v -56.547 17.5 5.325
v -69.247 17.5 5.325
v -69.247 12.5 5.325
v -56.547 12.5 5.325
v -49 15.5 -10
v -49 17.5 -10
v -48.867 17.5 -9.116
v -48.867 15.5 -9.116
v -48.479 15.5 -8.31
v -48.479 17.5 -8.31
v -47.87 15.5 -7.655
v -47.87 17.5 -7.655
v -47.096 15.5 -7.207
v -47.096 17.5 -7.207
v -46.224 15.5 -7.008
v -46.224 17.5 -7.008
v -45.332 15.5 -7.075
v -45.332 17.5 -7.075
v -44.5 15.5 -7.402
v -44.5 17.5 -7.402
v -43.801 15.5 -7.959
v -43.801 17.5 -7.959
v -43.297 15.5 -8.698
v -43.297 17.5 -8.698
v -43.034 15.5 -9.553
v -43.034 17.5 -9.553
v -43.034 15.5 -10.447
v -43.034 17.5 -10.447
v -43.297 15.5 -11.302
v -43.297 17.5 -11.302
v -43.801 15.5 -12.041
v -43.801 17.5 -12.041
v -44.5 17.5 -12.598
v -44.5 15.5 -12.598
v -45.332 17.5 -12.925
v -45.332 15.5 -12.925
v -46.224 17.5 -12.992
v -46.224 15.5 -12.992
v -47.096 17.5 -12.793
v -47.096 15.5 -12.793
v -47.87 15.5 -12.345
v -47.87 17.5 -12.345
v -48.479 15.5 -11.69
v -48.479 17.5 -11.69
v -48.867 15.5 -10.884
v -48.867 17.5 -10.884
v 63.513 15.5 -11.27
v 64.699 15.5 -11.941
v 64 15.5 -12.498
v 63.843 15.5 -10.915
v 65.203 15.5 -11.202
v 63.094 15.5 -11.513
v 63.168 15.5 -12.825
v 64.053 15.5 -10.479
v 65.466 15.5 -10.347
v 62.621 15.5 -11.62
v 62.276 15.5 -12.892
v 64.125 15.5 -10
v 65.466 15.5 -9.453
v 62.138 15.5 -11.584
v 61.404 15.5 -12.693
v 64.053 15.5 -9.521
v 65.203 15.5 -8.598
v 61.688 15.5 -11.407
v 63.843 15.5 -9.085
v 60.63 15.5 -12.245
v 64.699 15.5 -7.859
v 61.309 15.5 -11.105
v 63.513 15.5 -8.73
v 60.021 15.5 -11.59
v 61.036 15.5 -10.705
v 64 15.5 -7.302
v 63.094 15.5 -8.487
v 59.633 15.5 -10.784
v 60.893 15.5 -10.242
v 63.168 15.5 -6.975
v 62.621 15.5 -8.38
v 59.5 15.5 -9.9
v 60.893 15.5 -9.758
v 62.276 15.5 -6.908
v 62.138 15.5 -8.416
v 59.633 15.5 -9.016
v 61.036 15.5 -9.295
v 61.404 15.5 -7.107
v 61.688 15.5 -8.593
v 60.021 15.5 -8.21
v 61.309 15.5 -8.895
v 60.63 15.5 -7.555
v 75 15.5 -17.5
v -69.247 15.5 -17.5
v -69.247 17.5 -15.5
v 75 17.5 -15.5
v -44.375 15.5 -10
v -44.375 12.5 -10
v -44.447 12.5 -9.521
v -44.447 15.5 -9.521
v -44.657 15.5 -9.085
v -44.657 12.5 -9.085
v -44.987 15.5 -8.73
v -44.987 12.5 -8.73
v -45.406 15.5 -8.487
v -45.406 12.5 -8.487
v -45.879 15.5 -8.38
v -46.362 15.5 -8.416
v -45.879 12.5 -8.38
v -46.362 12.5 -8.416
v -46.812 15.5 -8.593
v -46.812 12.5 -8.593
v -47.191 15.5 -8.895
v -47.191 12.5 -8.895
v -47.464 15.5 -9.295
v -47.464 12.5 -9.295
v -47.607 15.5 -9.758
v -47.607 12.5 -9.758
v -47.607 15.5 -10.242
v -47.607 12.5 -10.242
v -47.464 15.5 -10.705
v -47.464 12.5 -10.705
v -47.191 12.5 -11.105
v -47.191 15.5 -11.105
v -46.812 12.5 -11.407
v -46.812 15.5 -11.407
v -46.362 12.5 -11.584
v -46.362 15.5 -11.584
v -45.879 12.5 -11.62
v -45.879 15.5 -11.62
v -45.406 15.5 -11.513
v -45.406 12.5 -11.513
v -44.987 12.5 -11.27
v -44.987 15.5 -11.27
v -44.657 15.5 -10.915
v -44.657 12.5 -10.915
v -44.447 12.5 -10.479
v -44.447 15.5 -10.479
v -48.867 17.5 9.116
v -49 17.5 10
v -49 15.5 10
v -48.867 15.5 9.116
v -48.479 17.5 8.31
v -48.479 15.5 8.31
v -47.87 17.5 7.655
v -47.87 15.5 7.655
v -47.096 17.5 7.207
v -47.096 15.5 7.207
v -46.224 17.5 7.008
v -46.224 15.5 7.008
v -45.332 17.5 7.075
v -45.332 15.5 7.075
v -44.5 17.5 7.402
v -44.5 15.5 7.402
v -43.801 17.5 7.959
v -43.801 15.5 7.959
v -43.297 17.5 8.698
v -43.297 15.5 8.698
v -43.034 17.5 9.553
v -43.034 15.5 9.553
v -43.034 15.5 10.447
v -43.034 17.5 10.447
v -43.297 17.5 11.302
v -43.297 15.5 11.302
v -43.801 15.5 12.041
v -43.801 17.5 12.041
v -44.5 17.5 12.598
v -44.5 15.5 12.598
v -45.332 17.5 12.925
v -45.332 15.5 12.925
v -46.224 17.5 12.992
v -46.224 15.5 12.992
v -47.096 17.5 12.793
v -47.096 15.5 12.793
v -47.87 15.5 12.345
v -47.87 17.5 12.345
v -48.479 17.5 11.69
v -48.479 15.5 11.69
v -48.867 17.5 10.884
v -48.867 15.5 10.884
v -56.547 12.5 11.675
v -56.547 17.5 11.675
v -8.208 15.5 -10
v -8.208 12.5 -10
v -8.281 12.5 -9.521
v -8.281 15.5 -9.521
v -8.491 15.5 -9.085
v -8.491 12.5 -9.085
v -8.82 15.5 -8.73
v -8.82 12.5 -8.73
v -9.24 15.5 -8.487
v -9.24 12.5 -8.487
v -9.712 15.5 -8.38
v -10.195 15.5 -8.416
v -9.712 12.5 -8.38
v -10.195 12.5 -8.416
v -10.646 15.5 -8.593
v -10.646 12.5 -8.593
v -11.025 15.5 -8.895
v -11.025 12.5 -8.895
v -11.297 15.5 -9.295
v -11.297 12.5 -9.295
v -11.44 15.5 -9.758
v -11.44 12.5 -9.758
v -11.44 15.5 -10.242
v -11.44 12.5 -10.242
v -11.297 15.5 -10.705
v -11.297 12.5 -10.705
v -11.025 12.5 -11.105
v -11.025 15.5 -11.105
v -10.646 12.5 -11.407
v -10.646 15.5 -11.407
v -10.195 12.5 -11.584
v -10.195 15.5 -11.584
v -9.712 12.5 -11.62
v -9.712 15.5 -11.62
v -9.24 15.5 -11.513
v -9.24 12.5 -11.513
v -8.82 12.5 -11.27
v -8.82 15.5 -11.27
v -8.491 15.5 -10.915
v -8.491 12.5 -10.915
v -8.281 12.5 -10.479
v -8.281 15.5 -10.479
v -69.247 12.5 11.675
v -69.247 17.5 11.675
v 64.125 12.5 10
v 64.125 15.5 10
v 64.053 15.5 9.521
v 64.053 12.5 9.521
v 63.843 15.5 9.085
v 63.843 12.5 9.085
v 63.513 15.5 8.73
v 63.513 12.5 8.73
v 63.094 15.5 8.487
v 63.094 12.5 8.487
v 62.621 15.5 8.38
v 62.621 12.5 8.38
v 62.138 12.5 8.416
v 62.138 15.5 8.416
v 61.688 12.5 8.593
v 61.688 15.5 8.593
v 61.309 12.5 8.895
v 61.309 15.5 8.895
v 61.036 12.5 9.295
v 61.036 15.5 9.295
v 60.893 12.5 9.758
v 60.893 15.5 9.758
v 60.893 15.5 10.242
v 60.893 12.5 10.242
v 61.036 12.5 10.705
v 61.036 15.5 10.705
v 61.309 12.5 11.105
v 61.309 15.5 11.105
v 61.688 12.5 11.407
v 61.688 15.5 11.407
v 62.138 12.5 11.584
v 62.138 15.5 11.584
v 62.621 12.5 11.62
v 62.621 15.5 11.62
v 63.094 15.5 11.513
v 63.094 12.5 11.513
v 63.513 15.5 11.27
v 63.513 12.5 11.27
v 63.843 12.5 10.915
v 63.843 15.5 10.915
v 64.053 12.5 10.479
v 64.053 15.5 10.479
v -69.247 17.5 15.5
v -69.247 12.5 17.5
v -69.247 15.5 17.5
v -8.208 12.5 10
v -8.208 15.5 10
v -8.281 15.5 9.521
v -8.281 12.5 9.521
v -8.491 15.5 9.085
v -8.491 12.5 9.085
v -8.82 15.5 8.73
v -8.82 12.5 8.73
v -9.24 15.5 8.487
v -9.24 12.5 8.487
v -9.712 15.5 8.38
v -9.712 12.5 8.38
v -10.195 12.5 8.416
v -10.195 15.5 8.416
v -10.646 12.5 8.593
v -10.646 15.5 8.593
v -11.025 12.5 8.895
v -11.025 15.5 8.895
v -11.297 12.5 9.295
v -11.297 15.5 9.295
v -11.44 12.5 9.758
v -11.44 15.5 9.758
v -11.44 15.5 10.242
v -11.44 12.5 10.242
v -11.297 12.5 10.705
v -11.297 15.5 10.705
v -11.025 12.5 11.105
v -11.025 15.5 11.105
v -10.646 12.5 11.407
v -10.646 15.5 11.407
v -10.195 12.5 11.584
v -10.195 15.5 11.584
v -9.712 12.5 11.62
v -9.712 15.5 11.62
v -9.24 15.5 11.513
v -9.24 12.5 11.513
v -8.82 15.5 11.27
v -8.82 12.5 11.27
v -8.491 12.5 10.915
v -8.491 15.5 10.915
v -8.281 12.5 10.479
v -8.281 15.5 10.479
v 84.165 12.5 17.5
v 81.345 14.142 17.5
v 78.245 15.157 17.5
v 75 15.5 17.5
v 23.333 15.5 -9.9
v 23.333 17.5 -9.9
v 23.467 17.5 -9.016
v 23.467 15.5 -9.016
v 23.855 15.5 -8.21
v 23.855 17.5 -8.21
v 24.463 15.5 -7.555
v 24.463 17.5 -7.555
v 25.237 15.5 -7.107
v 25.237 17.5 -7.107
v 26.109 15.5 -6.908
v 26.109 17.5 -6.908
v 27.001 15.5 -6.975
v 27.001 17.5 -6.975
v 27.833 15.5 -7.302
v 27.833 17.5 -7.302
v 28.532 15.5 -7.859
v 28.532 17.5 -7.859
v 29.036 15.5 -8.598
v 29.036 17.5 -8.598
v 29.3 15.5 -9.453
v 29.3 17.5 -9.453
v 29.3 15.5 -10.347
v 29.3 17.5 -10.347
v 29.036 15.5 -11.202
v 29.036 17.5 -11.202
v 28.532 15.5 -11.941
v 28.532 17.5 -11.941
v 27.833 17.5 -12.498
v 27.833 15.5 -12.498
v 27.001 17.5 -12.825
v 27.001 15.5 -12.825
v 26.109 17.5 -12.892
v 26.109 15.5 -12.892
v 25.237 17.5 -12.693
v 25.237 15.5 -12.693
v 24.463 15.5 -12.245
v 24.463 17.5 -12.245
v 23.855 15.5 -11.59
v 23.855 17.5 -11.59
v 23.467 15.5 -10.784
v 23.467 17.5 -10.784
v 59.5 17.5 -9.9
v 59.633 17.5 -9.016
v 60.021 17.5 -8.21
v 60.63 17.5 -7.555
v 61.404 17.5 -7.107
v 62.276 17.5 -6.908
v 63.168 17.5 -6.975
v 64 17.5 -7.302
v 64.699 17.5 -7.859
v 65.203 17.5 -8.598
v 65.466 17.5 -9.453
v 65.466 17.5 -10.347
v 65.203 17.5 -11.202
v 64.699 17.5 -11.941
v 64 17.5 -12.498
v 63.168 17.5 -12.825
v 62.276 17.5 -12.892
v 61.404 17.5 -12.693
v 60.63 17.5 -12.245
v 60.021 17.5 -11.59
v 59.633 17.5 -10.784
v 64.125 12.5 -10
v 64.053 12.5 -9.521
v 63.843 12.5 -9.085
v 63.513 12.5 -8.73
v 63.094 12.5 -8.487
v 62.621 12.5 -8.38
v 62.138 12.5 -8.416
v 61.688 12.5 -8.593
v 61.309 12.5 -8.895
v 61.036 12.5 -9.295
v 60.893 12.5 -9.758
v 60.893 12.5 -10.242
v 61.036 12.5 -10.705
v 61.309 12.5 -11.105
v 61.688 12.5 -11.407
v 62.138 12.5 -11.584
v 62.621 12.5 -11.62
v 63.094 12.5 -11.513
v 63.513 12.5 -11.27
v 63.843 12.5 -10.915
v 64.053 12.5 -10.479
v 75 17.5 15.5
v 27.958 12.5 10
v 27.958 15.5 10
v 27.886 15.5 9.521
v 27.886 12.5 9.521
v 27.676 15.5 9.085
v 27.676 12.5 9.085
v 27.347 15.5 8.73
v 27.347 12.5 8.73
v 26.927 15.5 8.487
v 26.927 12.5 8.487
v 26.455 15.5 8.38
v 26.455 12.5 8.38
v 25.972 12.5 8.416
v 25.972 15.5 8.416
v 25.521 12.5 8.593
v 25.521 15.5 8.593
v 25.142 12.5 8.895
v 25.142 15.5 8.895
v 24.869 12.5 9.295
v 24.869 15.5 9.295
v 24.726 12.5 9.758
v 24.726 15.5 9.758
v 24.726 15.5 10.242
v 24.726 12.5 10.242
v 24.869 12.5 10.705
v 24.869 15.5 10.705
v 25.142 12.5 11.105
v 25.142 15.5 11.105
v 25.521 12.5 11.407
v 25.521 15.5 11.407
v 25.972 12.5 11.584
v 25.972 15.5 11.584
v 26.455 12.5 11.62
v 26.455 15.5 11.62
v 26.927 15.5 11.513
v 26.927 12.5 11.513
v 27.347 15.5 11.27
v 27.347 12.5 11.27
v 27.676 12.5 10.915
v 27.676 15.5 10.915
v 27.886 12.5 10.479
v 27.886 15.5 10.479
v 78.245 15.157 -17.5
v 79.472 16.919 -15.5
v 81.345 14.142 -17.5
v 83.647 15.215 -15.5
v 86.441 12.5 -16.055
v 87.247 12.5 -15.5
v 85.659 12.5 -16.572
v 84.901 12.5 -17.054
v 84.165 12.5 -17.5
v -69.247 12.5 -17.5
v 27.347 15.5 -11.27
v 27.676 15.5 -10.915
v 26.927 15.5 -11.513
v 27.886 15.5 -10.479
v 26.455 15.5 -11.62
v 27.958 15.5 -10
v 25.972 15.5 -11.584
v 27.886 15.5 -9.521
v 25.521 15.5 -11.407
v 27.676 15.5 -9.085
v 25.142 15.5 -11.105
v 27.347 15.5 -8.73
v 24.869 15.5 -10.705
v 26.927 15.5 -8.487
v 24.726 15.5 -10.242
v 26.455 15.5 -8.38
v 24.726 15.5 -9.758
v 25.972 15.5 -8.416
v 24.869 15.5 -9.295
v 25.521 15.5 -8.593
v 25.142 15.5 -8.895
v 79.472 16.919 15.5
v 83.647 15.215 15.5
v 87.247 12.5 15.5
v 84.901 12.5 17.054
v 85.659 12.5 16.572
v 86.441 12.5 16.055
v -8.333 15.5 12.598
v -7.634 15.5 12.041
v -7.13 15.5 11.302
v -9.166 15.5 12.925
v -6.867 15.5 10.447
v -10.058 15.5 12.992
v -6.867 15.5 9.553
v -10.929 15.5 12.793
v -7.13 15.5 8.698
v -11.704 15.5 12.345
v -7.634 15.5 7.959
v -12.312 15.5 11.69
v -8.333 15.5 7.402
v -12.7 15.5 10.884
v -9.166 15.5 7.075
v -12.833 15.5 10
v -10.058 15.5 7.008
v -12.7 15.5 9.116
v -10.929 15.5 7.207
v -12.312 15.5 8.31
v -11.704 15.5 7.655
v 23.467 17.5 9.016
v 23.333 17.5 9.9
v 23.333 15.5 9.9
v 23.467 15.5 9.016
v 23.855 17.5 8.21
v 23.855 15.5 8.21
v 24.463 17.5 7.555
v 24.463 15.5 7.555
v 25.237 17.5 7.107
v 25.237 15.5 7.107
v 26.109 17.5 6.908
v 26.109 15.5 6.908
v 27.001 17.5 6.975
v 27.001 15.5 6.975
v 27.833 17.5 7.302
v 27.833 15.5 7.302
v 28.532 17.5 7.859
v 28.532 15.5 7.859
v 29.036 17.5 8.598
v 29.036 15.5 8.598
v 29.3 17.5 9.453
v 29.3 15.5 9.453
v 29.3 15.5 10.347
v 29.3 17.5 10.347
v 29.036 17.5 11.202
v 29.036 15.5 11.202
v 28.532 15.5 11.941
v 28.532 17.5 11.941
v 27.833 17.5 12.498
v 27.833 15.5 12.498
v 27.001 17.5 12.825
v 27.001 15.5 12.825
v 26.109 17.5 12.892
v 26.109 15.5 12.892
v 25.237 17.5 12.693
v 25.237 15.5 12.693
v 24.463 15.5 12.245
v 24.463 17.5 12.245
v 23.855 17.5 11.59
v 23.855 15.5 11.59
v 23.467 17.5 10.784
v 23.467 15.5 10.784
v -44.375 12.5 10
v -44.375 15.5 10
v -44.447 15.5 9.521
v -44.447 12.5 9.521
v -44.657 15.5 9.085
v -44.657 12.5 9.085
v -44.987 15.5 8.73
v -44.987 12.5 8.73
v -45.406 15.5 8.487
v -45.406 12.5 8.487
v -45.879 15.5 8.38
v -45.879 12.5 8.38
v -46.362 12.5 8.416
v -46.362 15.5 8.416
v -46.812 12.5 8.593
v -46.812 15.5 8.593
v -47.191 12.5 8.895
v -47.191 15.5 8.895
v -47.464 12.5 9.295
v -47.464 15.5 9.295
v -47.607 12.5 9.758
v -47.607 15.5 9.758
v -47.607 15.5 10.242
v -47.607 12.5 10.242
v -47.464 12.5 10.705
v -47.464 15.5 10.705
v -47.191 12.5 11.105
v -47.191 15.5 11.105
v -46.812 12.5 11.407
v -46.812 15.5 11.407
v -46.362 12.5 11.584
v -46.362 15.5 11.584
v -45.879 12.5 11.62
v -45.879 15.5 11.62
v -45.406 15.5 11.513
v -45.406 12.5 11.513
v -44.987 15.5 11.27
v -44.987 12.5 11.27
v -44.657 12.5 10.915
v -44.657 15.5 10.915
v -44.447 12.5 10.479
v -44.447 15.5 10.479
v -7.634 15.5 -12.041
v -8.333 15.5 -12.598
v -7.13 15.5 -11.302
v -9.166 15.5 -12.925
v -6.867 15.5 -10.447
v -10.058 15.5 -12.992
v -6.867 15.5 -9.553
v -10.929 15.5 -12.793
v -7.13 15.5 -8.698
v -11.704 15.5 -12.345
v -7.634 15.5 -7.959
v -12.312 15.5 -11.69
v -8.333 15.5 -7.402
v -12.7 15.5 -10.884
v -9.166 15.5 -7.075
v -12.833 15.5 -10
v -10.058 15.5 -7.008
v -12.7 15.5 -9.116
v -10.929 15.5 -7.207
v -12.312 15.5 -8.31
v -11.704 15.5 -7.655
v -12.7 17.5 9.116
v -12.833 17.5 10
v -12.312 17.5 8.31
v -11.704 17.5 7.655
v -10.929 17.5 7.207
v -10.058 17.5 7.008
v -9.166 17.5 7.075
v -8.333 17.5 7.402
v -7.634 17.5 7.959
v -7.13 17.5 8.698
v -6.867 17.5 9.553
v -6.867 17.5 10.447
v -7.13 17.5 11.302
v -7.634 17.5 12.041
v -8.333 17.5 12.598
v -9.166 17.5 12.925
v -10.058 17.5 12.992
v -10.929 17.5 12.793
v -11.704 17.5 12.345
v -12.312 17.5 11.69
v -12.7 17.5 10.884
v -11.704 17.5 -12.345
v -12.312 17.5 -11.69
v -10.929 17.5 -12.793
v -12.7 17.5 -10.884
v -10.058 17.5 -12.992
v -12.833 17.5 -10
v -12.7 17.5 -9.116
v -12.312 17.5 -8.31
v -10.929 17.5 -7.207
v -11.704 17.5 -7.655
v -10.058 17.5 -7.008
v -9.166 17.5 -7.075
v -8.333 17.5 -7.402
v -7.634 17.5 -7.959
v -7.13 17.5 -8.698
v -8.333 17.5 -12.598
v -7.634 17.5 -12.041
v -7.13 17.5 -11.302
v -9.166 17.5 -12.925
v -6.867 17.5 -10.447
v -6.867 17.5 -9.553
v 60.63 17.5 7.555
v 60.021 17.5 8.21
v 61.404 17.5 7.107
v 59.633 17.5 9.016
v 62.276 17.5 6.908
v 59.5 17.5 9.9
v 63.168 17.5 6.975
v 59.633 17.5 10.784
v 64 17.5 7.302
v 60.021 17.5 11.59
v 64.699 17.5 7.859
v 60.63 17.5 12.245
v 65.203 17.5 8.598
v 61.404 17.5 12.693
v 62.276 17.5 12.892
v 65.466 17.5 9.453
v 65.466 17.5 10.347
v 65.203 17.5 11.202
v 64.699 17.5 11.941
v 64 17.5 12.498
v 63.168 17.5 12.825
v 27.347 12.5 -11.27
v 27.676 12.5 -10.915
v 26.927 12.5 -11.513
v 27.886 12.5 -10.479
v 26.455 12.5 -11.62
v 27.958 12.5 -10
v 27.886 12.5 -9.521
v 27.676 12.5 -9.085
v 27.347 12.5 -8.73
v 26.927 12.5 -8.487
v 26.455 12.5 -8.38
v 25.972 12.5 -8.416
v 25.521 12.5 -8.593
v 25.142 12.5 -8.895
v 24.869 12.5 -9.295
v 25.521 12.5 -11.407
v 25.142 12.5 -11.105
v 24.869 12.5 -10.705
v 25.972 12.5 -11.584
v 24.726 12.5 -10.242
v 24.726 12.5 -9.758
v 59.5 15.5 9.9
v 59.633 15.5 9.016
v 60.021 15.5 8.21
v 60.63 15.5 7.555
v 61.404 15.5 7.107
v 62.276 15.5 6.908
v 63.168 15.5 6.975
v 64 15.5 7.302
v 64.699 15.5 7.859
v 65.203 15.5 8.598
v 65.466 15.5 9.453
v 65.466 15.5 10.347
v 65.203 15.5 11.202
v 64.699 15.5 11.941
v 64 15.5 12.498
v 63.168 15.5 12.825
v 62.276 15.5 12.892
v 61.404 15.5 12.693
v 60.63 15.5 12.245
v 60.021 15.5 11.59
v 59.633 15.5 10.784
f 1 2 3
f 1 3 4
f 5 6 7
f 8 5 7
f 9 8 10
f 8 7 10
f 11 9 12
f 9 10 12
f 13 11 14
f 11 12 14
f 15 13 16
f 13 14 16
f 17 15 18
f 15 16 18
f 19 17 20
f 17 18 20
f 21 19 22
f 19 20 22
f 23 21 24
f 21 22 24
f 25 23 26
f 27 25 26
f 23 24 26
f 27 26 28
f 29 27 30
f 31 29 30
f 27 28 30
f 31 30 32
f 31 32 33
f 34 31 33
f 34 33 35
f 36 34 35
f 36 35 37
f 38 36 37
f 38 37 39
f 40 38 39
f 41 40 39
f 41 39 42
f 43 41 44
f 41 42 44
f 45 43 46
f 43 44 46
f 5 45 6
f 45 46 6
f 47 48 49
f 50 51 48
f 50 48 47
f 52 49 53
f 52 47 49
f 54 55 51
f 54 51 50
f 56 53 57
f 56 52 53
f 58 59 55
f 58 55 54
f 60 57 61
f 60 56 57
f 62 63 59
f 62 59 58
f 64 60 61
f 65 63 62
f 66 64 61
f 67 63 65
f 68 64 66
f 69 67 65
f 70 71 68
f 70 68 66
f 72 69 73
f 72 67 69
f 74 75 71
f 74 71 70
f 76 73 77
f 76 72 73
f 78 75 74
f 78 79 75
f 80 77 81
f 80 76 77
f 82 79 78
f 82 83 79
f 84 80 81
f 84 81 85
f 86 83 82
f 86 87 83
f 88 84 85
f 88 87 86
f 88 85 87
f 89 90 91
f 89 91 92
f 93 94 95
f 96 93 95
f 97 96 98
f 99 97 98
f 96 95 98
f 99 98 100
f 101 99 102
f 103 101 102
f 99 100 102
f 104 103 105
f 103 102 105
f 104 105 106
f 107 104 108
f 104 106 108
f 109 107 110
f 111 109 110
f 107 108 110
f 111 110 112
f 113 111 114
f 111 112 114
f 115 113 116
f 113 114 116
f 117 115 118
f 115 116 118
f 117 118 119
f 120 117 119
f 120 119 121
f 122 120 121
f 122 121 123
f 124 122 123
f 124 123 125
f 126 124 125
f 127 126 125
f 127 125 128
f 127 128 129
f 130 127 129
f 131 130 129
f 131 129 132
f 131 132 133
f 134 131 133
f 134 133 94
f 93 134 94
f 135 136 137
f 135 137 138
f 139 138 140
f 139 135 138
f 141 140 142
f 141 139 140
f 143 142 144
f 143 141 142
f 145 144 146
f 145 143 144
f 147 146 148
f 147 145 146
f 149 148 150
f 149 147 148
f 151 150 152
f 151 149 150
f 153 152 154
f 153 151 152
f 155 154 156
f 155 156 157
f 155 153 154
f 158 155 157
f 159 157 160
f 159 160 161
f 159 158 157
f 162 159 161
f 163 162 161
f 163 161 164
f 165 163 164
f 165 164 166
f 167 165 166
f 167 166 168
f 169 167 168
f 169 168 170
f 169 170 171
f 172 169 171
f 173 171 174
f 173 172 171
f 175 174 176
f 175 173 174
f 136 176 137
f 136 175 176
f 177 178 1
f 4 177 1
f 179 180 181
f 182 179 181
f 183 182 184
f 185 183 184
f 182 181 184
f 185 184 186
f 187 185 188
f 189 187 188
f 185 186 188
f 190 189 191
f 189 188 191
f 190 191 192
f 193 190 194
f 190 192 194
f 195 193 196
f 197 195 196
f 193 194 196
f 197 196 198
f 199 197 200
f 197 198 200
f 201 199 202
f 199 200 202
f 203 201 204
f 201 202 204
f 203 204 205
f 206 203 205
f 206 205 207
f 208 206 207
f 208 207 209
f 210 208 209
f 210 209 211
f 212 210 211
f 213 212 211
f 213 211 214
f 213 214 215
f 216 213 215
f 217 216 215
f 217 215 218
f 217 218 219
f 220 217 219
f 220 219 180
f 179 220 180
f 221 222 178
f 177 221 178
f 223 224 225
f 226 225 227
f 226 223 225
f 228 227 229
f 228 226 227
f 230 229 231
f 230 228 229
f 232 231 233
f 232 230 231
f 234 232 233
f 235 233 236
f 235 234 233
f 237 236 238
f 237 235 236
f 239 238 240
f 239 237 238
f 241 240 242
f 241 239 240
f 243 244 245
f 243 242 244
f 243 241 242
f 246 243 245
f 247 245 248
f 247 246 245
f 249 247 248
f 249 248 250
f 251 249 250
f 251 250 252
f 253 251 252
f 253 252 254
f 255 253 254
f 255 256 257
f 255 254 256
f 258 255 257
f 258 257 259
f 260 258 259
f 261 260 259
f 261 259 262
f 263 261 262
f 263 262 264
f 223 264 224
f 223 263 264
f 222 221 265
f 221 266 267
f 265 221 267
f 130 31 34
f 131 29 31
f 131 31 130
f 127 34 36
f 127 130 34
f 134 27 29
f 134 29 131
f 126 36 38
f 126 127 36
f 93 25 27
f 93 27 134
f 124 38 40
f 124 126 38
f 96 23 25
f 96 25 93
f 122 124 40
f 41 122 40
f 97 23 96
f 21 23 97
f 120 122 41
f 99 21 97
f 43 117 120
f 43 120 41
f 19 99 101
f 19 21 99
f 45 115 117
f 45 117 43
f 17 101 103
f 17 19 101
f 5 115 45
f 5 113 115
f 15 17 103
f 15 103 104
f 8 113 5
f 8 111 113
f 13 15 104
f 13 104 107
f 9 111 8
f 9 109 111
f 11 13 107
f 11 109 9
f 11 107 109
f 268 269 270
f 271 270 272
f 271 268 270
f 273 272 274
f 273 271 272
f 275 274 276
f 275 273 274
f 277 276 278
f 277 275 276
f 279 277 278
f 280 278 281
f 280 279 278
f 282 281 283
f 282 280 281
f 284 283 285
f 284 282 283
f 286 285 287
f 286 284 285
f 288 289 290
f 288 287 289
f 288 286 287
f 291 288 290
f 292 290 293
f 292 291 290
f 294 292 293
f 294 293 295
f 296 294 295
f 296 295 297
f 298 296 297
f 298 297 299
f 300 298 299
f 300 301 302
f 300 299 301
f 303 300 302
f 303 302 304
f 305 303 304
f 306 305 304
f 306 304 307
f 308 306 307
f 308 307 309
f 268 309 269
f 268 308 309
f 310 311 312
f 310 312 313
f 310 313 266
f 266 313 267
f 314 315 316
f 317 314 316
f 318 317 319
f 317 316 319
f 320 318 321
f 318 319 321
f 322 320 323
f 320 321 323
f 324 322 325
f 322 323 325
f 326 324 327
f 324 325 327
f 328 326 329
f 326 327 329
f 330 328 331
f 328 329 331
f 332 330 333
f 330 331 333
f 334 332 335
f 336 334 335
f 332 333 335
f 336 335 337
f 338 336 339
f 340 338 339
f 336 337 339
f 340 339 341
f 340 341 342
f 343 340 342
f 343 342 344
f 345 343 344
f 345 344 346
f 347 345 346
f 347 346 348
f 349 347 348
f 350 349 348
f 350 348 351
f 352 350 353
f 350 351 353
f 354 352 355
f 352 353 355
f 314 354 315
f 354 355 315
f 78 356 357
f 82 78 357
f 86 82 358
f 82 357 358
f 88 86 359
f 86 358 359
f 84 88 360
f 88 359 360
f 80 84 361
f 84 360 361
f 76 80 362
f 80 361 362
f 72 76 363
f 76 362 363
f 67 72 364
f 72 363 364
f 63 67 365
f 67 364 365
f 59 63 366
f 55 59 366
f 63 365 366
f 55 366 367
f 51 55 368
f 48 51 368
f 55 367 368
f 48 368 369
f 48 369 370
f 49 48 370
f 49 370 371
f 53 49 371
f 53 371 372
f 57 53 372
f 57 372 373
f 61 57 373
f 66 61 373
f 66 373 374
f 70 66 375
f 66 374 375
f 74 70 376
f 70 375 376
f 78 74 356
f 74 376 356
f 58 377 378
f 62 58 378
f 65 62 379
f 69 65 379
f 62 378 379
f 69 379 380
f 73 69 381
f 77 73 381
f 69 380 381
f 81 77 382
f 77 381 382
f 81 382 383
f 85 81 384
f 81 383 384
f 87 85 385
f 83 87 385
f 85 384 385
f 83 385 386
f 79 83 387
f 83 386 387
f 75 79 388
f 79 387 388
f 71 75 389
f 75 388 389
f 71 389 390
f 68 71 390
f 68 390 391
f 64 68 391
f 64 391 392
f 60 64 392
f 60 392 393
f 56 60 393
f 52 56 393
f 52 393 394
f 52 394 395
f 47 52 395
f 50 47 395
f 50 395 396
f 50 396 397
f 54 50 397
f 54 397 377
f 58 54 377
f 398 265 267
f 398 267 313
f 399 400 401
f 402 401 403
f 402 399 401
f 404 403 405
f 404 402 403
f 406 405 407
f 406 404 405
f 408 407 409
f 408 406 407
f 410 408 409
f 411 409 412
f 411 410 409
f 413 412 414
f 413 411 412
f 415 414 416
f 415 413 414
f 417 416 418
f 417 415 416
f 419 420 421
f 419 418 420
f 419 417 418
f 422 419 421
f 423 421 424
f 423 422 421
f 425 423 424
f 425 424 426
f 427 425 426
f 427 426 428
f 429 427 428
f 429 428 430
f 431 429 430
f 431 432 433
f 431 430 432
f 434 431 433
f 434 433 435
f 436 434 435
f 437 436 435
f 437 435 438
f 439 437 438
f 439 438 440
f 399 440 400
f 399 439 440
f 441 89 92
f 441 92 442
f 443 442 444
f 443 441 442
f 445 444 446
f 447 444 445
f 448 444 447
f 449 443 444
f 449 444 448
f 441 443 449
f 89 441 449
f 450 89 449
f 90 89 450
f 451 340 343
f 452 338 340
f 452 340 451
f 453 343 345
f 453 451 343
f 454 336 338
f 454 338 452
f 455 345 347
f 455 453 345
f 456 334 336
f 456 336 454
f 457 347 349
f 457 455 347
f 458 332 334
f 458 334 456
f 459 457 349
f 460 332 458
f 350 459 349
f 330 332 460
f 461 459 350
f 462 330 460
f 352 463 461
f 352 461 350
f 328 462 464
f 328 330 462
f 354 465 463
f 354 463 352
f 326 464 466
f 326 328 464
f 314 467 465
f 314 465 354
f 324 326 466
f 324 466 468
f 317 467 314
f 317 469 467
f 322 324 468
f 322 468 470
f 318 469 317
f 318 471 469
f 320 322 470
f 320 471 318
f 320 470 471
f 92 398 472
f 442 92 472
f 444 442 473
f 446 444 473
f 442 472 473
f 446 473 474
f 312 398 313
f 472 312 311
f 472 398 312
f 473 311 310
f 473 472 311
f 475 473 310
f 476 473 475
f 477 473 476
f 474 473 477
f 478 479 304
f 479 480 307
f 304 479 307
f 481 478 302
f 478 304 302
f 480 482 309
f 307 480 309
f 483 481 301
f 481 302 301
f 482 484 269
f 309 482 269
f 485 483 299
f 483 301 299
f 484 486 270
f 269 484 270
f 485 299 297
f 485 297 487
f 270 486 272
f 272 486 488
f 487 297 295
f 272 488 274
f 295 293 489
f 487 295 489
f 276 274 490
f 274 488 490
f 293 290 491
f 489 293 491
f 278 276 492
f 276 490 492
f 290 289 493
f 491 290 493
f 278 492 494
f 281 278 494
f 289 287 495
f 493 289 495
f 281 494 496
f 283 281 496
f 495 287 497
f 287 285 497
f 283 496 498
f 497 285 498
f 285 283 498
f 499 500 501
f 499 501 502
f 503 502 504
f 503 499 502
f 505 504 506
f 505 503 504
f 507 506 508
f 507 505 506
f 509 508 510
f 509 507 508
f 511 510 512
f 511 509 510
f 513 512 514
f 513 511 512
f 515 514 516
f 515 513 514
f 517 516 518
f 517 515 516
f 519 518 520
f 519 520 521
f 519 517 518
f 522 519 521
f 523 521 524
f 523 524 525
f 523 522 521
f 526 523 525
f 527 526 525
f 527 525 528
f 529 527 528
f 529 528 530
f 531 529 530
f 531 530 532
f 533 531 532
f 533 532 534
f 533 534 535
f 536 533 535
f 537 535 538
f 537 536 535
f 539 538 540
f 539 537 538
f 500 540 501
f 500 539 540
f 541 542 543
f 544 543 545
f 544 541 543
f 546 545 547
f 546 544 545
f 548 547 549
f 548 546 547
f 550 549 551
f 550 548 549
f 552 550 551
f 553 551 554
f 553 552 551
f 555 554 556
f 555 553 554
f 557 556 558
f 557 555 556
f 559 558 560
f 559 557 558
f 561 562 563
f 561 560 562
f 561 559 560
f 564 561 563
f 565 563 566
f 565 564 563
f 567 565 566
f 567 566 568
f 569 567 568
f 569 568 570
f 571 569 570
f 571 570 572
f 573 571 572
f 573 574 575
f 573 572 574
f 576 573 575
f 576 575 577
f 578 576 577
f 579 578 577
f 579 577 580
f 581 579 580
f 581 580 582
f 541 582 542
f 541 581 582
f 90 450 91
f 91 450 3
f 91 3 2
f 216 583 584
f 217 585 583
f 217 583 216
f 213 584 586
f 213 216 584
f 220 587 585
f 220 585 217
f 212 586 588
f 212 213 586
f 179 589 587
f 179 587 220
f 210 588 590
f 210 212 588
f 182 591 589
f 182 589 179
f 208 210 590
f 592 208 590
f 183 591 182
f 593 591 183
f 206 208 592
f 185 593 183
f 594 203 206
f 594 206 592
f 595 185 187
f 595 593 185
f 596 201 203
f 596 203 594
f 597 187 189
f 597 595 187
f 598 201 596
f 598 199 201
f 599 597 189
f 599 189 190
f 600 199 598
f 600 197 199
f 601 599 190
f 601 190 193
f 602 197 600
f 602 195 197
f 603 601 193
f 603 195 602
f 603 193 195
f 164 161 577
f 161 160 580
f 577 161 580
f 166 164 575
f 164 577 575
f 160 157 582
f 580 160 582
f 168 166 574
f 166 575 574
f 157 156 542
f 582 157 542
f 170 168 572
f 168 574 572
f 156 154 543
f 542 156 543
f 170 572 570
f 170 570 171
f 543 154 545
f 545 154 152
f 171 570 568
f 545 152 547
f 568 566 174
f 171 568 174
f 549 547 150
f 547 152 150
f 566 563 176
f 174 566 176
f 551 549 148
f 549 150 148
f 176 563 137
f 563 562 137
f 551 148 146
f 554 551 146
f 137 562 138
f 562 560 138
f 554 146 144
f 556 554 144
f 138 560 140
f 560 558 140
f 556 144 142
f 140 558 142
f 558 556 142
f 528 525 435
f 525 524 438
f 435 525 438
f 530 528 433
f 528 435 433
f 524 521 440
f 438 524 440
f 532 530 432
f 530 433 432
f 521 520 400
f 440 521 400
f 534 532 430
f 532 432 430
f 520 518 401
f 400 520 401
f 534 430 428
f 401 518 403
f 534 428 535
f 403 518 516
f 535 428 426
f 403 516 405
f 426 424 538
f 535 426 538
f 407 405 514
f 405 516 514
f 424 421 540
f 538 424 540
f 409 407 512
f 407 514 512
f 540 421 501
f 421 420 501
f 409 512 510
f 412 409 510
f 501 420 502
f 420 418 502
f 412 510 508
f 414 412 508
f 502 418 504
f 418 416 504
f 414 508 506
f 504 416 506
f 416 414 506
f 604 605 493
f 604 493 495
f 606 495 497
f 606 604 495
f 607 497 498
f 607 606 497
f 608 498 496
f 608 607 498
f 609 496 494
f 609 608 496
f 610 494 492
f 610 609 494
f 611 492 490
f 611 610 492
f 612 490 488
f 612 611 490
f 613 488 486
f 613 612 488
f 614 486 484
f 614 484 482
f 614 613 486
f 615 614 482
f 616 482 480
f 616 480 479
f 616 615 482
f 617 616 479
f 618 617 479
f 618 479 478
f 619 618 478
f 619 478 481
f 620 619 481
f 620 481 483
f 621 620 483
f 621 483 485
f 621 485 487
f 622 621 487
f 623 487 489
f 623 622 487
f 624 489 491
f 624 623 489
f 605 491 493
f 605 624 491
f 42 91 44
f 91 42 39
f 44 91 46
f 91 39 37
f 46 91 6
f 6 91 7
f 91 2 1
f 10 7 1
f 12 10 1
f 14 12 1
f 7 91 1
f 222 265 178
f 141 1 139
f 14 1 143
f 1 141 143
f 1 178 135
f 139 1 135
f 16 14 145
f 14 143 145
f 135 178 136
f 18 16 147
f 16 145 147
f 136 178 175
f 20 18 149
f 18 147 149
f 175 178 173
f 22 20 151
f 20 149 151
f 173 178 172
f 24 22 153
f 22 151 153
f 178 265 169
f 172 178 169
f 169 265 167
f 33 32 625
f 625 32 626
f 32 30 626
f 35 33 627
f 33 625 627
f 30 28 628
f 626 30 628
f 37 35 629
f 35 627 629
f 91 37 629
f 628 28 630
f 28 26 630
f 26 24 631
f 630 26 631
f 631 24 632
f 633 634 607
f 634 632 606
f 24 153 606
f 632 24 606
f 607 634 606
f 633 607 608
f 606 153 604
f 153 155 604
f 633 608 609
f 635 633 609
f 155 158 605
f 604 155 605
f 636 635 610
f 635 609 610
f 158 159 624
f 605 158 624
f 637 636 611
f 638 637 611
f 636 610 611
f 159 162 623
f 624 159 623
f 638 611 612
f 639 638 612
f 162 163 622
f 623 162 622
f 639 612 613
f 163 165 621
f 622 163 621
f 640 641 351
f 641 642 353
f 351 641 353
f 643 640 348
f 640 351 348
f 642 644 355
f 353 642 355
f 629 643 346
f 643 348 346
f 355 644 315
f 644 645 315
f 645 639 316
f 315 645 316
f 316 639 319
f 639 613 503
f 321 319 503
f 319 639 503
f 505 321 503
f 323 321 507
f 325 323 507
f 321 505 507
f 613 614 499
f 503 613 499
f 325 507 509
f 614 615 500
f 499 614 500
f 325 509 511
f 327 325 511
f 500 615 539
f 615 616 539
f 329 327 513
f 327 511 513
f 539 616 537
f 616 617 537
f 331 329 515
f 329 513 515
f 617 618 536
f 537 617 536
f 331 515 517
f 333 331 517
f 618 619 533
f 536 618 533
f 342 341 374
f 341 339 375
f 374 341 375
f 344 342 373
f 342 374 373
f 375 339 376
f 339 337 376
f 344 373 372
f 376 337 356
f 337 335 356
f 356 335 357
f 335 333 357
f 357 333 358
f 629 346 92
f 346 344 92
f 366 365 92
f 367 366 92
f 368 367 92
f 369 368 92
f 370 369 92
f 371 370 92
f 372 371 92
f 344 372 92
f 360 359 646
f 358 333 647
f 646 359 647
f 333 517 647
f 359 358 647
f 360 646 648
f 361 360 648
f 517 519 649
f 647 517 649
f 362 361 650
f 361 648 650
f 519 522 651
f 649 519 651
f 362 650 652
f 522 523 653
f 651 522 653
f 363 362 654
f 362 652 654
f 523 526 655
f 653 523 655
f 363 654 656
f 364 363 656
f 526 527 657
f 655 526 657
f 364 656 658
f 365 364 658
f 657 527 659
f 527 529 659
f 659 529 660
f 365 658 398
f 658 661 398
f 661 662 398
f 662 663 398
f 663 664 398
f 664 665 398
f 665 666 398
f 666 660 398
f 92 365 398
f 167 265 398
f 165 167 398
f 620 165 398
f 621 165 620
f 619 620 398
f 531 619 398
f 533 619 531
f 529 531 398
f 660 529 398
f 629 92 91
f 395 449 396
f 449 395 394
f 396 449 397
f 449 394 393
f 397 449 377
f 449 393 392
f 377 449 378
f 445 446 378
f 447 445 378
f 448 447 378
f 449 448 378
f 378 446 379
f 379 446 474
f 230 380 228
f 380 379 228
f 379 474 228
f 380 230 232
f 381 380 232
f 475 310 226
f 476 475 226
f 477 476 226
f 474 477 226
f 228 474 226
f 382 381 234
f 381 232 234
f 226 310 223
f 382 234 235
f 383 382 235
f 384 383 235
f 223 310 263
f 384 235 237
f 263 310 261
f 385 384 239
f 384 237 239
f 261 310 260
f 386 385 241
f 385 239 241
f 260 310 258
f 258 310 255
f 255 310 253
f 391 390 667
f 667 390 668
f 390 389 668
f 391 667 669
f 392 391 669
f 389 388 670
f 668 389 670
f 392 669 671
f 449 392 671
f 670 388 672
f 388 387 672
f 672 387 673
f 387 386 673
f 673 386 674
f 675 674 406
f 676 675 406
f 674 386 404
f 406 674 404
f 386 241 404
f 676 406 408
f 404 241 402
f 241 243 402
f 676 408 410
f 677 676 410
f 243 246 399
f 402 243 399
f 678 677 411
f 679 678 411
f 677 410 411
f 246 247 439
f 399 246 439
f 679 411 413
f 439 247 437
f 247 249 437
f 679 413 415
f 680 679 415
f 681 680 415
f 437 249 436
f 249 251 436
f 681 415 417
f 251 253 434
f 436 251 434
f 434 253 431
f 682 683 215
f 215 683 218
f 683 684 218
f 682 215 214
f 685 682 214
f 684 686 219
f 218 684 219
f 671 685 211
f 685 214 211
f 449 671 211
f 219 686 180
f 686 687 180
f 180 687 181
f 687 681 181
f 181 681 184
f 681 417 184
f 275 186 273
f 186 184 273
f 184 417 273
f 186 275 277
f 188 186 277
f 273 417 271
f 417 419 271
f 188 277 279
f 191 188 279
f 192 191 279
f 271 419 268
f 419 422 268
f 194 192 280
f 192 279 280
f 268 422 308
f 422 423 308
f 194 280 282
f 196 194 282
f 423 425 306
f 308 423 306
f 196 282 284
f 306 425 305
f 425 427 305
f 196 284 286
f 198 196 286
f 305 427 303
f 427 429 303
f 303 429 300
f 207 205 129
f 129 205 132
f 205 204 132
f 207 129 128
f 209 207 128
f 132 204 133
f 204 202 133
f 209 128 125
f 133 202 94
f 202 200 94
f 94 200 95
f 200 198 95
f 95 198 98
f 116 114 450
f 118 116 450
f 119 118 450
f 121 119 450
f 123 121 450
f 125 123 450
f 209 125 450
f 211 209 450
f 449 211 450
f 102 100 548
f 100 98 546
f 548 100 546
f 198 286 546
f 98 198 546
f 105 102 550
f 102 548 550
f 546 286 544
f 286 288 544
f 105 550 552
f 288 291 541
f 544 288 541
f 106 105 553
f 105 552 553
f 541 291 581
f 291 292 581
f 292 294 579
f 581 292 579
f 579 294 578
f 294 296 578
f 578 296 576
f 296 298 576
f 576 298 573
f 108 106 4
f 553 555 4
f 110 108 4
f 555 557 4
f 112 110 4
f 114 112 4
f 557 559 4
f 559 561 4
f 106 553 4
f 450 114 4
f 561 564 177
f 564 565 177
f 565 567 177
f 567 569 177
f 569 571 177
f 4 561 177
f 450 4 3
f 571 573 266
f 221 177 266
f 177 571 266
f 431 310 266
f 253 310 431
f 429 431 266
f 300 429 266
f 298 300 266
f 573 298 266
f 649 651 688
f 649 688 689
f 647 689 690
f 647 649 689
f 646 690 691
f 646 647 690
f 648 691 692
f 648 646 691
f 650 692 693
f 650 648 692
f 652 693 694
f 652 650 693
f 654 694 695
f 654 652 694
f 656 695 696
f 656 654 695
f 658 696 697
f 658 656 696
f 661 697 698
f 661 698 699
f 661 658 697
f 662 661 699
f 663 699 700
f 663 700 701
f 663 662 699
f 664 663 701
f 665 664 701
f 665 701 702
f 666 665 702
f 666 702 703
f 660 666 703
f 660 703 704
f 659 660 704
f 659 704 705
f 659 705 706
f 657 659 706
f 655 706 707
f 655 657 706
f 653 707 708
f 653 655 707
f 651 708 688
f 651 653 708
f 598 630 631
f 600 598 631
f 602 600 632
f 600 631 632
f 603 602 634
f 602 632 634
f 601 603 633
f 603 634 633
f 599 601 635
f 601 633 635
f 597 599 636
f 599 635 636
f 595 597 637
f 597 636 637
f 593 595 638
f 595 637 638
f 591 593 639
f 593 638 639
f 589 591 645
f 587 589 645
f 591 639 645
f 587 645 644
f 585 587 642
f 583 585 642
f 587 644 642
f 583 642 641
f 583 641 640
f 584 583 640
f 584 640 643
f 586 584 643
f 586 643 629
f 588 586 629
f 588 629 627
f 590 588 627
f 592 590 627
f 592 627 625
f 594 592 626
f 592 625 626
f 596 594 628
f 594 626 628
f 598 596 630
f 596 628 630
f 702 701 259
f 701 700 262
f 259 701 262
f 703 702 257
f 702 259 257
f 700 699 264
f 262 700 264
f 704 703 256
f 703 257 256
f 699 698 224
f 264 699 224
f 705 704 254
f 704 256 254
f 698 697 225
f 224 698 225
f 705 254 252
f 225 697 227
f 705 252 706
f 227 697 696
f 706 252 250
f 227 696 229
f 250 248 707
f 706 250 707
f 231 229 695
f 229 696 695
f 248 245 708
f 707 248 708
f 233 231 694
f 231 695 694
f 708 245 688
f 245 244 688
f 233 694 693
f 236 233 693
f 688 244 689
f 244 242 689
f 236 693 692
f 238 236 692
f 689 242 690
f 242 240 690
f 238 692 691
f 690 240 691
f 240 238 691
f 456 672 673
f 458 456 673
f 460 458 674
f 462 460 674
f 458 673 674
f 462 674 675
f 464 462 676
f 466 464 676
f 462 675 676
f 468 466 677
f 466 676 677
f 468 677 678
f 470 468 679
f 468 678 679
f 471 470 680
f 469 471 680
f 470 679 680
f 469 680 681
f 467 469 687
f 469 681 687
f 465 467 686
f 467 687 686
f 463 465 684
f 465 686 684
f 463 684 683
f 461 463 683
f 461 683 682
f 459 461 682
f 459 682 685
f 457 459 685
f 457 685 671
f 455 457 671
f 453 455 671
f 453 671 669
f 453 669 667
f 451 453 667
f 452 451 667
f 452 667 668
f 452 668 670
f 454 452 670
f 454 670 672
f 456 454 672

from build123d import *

# Parameters (mm, degrees)
BOSS_EXTRUDE1_DEPTH = 17.5
SKETCH2_W           = 18
SKETCH2_H           = 5
CUT_EXTRUDE1_DEPTH  = 17.5
SKETCH3_R           = 1.625
CUT_EXTRUDE2_DEPTH  = 5
SKETCH4_R           = 3
CUT_EXTRUDE3_DEPTH  = 2
CHAMFER1_SIZE       = 2
SKETCH5_W           = 12.7
SKETCH5_H           = 6.35
CUT_EXTRUDE4_DEPTH  = 5


with BuildPart() as part:
    # Sketch1 → Boss-Extrude1 (new, symmetric)
    with BuildSketch(Plane.XY):
        with BuildLine():
            Line((-75, 17.5), (75, 17.5))
            ThreePointArc((75, 17.5), (81.614378278, 16.201851746), (87.247448714, 12.5))
            Line((87.247448714, 12.5), (-87.247448714, 12.5))
            ThreePointArc((-87.247448714, 12.5), (-81.614378278, 16.201851746), (-75, 17.5))
        make_face()
    extrude(amount=BOSS_EXTRUDE1_DEPTH, both=True)

    # Sketch2 → Cut-Extrude1 (cut, symmetric)
    with BuildSketch(Plane.XY):
        with Locations((-78.247448714, 15)):
            Rectangle(SKETCH2_W, SKETCH2_H)
    extrude(amount=CUT_EXTRUDE1_DEPTH, both=True, mode=Mode.SUBTRACT)

    # Sketch3 → Cut-Extrude2 (cut)
    with BuildSketch(Plane.XZ.offset(-12.5)):
        with Locations((-46, -10)):
            Circle(SKETCH3_R)
        with Locations((-9.833333333, -10)):
            Circle(SKETCH3_R)
        with Locations((26.333333333, -10)):
            Circle(SKETCH3_R)
        with Locations((62.5, -10)):
            Circle(SKETCH3_R)
    cut_extrude2 = extrude(amount=-CUT_EXTRUDE2_DEPTH, mode=Mode.SUBTRACT)

    # Sketch4 → Cut-Extrude3 (cut)
    with BuildSketch(Plane(origin=(0, 17.5, 0), x_dir=(1, 0, 0), z_dir=(0, 1, 0))):
        with Locations(Location((62.5, 9.9, 0), (0, 0, 180))):
            Circle(SKETCH4_R)
        with Locations(Location((26.333333333, 9.9, 0), (0, 0, 180))):
            Circle(SKETCH4_R)
        with Locations(Location((-9.833333333, 10, 0), (0, 0, 180))):
            Circle(SKETCH4_R)
        with Locations(Location((-46, 10, 0), (0, 0, 180))):
            Circle(SKETCH4_R)
    cut_extrude3 = extrude(amount=-CUT_EXTRUDE3_DEPTH, mode=Mode.SUBTRACT)

    # Mirror1: Cut-Extrude2, Cut-Extrude3 across plane
    add(cut_extrude2.mirror(Plane.XY), mode=Mode.SUBTRACT)
    add(cut_extrude3.mirror(Plane.XY), mode=Mode.SUBTRACT)

    # Chamfer1
    chamfer1_edges = [part.edges().sort_by_distance(p)[0] for p in [
        (81.614378278, 16.201851746, 17.5),
        (2.876275643, 17.5, 17.5),
        (2.876275643, 17.5, -17.5),
        (81.614378278, 16.201851746, -17.5),
    ]]
    chamfer(chamfer1_edges, length=CHAMFER1_SIZE)

    # Sketch5 → Cut-Extrude4 (cut)
    with BuildSketch(Plane(origin=(0, 17.5, 0), x_dir=(1, 0, 0), z_dir=(0, 1, 0))):
        with Locations((-62.897448714, -8.5)):
            Rectangle(SKETCH5_W, SKETCH5_H)
    extrude(amount=-CUT_EXTRUDE4_DEPTH, mode=Mode.SUBTRACT)


solid = part.part
